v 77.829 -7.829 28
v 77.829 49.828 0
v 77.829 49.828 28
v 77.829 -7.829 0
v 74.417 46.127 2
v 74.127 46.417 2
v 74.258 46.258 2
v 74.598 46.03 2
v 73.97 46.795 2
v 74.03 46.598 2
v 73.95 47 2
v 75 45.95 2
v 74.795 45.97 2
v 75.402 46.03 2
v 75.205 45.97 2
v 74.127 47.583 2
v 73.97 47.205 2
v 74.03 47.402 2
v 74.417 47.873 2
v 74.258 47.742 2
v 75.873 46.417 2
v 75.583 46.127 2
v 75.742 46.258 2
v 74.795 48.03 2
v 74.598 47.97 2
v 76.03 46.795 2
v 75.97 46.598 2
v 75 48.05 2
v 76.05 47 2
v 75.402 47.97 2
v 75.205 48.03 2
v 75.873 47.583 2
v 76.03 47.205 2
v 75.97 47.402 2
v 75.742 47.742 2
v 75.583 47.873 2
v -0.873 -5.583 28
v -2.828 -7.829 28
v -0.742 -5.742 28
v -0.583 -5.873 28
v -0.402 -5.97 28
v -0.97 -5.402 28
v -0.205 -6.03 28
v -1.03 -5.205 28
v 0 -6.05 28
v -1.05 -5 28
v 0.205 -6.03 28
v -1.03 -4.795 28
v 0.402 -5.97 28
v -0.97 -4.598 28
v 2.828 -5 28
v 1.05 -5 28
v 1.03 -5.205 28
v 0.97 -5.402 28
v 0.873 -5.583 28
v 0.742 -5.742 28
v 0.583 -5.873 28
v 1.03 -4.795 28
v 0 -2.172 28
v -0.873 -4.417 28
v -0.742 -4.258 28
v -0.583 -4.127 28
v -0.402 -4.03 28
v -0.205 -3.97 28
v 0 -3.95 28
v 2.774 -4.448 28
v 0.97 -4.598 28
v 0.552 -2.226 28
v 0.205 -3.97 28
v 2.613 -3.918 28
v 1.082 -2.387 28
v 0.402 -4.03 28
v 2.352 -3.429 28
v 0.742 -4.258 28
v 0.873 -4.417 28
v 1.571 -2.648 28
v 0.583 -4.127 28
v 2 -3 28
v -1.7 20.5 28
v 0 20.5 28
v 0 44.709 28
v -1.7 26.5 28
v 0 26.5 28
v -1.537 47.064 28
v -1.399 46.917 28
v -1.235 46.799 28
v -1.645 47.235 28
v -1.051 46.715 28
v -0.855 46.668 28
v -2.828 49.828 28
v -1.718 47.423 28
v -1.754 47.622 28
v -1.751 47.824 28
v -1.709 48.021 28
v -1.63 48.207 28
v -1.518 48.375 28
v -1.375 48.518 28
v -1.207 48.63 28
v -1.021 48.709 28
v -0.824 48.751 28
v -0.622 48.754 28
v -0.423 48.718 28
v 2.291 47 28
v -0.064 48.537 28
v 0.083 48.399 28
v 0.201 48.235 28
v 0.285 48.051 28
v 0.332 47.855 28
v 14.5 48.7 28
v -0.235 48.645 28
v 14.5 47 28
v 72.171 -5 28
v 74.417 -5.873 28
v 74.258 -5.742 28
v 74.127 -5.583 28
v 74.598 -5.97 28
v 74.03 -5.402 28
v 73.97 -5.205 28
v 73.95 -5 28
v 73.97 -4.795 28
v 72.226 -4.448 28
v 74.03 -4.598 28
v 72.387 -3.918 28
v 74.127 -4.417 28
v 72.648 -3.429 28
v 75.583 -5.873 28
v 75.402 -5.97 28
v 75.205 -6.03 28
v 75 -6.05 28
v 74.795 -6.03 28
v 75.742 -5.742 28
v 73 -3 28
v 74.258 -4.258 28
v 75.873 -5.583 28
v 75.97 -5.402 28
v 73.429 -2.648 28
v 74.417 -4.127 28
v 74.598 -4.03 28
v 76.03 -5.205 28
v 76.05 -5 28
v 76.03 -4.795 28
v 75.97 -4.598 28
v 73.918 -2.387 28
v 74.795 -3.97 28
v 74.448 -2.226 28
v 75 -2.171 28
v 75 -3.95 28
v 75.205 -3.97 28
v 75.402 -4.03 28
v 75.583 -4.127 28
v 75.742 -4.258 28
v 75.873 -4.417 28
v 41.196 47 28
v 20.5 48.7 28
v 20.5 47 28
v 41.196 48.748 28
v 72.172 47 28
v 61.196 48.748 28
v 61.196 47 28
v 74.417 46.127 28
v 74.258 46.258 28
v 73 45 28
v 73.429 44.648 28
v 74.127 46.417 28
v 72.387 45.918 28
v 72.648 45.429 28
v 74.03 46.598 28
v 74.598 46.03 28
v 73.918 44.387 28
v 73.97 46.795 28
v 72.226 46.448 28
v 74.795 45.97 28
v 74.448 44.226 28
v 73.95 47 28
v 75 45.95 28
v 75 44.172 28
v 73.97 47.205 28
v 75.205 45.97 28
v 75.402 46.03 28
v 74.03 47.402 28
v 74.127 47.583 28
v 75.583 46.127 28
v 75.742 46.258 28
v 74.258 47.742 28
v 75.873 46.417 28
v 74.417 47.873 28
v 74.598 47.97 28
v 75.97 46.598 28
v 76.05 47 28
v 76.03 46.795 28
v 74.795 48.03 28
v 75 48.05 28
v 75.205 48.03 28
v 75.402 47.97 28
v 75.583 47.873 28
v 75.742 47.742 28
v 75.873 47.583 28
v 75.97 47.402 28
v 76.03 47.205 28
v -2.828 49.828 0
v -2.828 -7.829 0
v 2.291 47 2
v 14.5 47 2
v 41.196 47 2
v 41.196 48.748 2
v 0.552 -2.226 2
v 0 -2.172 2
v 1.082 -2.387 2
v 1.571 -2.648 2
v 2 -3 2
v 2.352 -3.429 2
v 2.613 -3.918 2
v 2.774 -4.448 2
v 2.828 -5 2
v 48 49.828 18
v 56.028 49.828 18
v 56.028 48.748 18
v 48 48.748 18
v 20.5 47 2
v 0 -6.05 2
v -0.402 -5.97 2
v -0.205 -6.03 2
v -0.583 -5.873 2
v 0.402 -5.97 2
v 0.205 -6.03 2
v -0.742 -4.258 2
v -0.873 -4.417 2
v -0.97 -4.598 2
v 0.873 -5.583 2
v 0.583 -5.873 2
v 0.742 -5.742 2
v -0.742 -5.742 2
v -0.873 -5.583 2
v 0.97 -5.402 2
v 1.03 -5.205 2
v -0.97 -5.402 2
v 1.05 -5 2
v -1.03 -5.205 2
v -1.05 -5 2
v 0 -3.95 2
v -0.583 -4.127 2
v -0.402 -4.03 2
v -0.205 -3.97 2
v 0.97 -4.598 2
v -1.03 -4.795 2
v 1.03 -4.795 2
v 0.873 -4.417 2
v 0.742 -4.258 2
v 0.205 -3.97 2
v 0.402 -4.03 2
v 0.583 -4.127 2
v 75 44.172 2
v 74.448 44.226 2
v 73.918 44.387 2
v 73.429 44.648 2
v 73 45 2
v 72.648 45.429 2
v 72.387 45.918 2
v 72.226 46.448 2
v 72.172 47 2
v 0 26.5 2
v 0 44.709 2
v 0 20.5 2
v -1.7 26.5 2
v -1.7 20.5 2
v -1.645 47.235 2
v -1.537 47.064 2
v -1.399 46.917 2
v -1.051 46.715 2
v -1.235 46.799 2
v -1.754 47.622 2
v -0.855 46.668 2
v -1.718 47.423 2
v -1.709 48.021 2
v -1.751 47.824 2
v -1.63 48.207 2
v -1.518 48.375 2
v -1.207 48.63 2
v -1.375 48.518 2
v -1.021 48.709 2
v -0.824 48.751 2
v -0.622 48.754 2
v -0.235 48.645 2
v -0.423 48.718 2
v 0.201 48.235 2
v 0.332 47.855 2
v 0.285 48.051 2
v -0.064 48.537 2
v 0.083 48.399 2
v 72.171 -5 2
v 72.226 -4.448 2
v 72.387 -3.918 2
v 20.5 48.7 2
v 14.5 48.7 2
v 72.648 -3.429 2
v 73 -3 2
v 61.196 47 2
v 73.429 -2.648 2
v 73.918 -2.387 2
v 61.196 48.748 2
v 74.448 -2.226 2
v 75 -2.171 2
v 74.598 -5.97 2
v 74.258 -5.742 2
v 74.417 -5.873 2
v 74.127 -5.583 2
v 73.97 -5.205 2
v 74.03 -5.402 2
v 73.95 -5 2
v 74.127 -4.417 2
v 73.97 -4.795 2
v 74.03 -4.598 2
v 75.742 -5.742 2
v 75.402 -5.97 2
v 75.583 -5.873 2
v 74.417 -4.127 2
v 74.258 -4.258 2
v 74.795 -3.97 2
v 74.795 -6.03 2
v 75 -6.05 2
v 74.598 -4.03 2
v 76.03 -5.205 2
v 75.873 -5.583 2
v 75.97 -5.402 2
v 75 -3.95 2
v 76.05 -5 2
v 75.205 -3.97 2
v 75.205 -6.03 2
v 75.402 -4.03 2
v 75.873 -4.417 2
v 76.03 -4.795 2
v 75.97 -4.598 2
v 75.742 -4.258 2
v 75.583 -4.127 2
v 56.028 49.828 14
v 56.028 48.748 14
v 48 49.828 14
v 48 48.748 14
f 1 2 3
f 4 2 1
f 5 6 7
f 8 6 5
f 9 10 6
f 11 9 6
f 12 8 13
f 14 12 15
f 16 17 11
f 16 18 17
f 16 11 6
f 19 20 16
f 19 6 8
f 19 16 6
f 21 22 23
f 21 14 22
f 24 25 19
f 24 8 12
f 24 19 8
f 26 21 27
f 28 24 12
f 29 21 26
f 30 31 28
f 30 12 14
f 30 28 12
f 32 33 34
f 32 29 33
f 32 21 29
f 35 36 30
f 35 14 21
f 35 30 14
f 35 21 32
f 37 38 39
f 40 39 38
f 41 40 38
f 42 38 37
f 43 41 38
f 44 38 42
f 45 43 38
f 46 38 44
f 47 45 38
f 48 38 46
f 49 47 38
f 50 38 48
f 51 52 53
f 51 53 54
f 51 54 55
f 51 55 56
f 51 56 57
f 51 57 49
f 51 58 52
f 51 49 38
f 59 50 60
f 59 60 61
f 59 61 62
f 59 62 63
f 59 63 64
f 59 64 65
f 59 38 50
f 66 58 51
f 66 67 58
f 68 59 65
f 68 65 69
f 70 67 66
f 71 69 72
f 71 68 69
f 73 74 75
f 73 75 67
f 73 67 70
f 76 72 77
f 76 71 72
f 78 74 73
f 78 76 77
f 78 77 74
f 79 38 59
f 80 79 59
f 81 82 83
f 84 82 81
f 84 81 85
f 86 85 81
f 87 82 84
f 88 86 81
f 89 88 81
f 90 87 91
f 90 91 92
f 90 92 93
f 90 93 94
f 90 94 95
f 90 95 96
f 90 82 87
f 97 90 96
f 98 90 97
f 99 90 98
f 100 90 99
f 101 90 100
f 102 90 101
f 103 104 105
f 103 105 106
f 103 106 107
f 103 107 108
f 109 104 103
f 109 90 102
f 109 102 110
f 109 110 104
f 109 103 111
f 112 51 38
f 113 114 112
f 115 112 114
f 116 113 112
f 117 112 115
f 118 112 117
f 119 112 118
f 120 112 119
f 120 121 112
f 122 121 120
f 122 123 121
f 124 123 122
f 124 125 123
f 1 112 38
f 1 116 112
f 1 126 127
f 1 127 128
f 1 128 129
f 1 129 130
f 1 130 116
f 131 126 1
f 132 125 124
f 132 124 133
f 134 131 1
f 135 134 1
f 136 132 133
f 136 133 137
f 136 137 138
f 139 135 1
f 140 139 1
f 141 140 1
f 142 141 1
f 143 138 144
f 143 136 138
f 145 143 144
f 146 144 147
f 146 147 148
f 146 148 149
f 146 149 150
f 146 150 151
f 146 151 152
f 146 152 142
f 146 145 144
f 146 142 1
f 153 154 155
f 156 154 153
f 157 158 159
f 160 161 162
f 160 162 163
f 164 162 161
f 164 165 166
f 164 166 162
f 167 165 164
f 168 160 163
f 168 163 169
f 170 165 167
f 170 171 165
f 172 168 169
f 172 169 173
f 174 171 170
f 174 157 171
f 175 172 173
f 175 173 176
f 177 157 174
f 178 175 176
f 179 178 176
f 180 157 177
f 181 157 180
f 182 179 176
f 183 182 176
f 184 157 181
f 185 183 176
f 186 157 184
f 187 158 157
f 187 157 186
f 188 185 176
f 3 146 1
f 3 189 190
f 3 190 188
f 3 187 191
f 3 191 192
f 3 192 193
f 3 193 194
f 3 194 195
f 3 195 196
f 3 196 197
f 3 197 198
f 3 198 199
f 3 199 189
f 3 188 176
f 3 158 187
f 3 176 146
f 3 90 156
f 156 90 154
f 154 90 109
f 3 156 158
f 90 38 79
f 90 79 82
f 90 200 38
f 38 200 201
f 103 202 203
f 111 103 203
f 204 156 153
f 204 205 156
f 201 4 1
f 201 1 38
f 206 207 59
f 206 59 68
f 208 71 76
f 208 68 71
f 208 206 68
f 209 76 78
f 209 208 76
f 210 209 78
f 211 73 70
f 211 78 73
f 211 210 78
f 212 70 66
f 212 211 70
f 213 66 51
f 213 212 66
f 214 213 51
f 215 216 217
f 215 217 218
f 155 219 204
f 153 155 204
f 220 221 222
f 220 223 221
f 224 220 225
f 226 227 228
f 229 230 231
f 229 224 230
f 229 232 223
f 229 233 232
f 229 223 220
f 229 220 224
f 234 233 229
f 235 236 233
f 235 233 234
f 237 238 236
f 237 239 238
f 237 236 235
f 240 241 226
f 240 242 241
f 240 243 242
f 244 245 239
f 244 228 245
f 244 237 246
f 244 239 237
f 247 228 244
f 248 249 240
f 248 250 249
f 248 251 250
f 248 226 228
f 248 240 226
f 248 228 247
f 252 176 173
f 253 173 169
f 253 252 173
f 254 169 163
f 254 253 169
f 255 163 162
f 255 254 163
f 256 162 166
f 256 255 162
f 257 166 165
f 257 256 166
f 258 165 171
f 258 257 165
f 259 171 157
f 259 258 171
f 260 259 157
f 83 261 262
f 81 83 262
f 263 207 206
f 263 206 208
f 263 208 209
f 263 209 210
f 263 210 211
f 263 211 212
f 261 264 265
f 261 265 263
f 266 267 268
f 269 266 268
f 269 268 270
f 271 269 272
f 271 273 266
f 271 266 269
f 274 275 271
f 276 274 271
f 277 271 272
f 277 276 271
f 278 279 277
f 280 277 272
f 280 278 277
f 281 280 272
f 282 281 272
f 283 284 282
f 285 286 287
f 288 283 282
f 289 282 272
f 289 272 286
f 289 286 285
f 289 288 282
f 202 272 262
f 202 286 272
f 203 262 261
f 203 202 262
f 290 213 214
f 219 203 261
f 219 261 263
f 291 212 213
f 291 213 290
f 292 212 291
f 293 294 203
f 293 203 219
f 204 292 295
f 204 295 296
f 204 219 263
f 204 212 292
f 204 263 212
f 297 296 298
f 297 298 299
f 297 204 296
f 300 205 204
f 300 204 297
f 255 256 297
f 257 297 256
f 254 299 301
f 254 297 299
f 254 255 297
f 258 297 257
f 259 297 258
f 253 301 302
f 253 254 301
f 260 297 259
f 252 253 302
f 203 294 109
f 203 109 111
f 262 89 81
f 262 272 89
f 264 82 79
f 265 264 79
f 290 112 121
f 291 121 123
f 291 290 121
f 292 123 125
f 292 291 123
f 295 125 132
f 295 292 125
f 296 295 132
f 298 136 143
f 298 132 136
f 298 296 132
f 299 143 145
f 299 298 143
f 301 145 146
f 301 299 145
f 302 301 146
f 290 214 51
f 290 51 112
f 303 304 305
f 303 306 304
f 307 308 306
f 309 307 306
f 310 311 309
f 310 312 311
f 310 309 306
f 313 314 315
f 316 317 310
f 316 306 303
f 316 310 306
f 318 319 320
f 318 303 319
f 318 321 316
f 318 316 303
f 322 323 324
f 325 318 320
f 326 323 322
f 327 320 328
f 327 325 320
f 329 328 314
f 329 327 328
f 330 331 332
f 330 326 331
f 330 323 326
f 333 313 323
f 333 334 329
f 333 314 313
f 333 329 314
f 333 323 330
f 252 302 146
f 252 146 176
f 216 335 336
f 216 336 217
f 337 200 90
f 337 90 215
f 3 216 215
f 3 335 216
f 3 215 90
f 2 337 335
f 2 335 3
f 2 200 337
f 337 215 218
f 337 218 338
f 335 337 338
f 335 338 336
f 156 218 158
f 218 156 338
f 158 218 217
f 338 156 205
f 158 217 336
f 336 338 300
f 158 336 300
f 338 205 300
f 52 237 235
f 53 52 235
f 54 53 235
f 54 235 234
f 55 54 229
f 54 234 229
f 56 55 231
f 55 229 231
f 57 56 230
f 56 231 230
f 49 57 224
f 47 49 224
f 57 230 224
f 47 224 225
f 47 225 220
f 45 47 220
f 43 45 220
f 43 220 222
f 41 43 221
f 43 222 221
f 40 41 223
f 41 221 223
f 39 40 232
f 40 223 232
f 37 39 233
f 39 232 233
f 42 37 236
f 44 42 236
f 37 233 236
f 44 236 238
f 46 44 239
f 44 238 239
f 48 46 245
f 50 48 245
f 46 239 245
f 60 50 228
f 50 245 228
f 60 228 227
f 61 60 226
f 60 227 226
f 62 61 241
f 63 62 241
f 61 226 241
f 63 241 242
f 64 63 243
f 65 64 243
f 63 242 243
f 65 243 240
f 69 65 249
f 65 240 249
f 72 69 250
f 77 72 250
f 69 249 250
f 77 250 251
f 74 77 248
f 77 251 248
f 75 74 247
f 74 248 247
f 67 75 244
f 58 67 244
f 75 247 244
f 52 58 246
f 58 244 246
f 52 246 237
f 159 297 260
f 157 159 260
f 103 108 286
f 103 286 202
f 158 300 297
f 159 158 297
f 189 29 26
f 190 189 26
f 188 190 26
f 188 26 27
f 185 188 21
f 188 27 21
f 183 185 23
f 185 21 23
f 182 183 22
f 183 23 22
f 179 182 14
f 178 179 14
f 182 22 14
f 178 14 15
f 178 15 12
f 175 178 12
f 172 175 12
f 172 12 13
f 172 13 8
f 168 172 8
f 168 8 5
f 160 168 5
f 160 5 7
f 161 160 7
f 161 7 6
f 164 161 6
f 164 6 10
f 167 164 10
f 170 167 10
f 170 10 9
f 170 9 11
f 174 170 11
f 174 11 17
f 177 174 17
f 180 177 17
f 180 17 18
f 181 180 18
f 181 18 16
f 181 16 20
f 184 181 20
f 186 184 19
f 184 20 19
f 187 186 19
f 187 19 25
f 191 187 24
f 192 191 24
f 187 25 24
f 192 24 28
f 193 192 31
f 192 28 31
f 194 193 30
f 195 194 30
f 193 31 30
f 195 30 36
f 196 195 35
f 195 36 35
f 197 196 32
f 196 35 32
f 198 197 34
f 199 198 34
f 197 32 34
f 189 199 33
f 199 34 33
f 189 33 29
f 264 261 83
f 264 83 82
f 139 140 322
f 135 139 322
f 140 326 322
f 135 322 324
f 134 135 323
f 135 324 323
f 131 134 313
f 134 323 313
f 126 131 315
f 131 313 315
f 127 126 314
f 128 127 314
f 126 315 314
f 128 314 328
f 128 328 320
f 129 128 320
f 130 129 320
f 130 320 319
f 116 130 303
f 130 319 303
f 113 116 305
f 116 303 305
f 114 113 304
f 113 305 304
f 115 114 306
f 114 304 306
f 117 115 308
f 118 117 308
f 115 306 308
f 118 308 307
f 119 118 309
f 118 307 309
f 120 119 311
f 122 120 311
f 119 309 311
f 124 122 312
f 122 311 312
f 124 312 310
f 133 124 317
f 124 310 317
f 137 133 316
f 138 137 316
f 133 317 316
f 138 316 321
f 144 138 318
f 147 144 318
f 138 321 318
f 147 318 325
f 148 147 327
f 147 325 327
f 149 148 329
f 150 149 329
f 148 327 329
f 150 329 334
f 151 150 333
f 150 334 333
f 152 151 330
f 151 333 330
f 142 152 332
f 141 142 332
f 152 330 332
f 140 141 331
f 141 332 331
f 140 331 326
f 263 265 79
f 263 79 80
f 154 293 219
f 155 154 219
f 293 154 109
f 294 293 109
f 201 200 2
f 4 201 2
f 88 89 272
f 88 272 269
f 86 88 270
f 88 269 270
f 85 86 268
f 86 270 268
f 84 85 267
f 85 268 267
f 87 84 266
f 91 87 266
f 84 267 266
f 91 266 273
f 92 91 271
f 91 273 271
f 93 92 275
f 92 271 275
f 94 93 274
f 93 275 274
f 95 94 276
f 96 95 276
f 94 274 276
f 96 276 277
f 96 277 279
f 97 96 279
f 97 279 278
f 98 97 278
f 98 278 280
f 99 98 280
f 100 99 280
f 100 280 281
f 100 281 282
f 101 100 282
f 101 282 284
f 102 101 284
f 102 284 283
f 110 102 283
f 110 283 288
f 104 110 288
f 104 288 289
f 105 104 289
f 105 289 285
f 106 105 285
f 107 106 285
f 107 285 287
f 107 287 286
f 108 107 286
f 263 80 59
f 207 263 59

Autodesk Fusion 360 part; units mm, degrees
sketch "Sketch1" plane through (0, 0, 0) normal (0, 0, 1) x (1, 0, 0)
  line L0 (0, 0.9105) -> (0, 44.7087)
  line L1 (2.2913, 47) -> (17.5, 47)
  line L2 (17.5, 47) -> (15.35, 47)
  line L3 (0, 23.5) -> (0, 25.65)
  line L4 (0, 23.5) -> (0, 21.35)
  line L5 (-1.7, 23.5) -> (-1.7, 25.8)
  line L6 (-1.7, 23.5) -> (-1.7, 21.2)
  line L7 (70, 47) -> (74, 47) construction
  line L8 (0, 47) -> (-2.8284, 49.8284)
  line L9 (0, 47) -> (-4, 47) construction
  line L10 (-2.8284, 49.8284) -> (72.8284, 49.8284)
  line L11 (-2.8284, 49.8284) -> (-2.8284, -2.8284)
  line L12 (17.5, 47) -> (69, 47)
  line L13 (41.1957, 48.7475) -> (61.1957, 48.7475)
  line L14 (41.1957, 48.7475) -> (41.1957, 47)
  line L15 (61.1957, 48.7475) -> (61.1957, 47)
  line L16 (17.5, 48.7) -> (14.5, 48.7)
  line L17 (14.5, 48.7) -> (20.5, 48.7)
  line L18 (20.5, 48.7) -> (20.5, 47)
  line L19 (14.5, 48.7) -> (14.5, 47)
  line L20 (-1.7, 23.5) -> (-1.7, 26.5)
  line L21 (-1.7, 26.5) -> (-1.7, 23.5)
  line L22 (-1.7, 23.5) -> (-1.7, 20.5)
  line L23 (-1.7, 20.5) -> (-1.7, 26.5)
  line L24 (0, 26.5) -> (-1.7, 26.5)
  line L25 (-1.7, 20.5) -> (0, 20.5)
  line L26 (0, 47) -> (0, 48)
  line L27 (0, 48) -> (2.2913, 47)
  line L28 (0, 47) -> (-1, 47)
  line L29 (-1, 47) -> (0, 44.7087)
  arc A0 (0, 48) -> (-1, 47) centre (0, 47) ccw
  line L30 (-2.8284, 49.8284) -> (-2.8284, -7.8286)
  line L31 (-2.8284, 49.8284) -> (77.8286, 49.8284)
  line L32 (77.8286, 49.8284) -> (77.8286, -7.8286)
  line L33 (77.8286, -7.8286) -> (-2.8284, -7.8286)
  line L34 (0, -5) -> (75, -5)
  line L35 (75, -5) -> (75, 47)
  line L36 (75, 47) -> (69, 47)
  line L37 (0, 0.9105) -> (0, -5)
  circle A1 centre (75, 47) radius 2.8284
  circle A2 centre (75, 47) radius 1.05
  circle A3 centre (75, -5) radius 2.8286
  circle A4 centre (75, -5) radius 1.05
  circle A5 centre (0, -5) radius 2.8284
  circle A6 centre (0, -5) radius 1.05
  circle A7 centre (-0.7071, 47.7071) radius 1.05
  dimension "d2" = 47
  dimension "d3" = 17.5
  dimension "d5" = 2.15
  dimension "d23" = 2.15
  dimension "d25" = 1.7
  dimension "d26" = 2.3
  dimension "d27" = 2.3
  dimension "d33" = 45
  dimension "d34" = 4
  dimension "d59" = 6
  dimension "d60" = 3
  dimension "d61" = 3
  dimension "d63" = 2
  dimension "d70" = 20
  dimension "d72" = 2.5
  dimension "d73" = 2.5
  dimension "d126" = 57.657
  dimension "d127" = 80.657
  dimension "d128" = 2.1
  dimension "d129" = 2.1
  dimension "d130" = 2.1
  dimension "d131" = 2.1
sketch "Sketch2" plane through (0, 49.8284, 0) normal (0, 1, 0) x (-1, 0, 0)
  line L0 (-72.8284, 0) -> (2.8284, 0)
  line L1 (2.8284, 0) -> (2.8284, 28)
  line L2 (2.8284, 28) -> (-72.8284, 28)
  line L3 (-72.8284, 28) -> (-72.8284, 0)
  line L4 (-72.8284, 0) -> (-42.8284, 0)
  line L5 (-42.8284, 0) -> (-52.0284, 0)
  line L6 (-52.0284, 0) -> (-52.0284, 18)
  line L7 (-52.0284, 18) -> (-56.0284, 18)
  line L8 (-56.0284, 18) -> (-48.0284, 18)
  line L9 (-48.0284, 18) -> (-48.0284, 15)
  line L10 (-56.0284, 15) -> (-56.0284, 18)
  line L11 (-56.0284, 18) -> (-48, 18)
  line L12 (-48, 18) -> (-48, 14)
  line L13 (-48, 14) -> (-56.0284, 14)
  line L14 (-56.0284, 14) -> (-56.0284, 18)
  dimension "d49" = 30
  dimension "d50" = 9.2
  dimension "d51" = 18
  dimension "d52" = 4
  dimension "d53" = 8
  dimension "d54" = 3
extrude "Extrude25" add sketch "Sketch1" along normal blind 28 contours L0 L5 L6 L8 L11 L20 L21 L22 L23 L24 L25 L29 L30 L37 A5 A7 | L34 L37 A5 A6 | L34 L37 A5 A6 | L33 L34 A3 A5 | L30 L33 A5 | L34 L35 A3 A4 | L34 L35 A3 A4 | L32 L35 A1 A3 | L32 L33 A3 | L1 L8 L10 L12 L13 L14 L15 L16 L17 L18 L19 L27 L31 L36 A1 A7 | L35 L36 A1 A2 | L35 L36 A1 A2 | L31 L32 A1
extrude "Extrude26" add sketch "Sketch1" along normal blind 2
extrude "Extrude27" cut sketch "Sketch2" against normal blind 6 contours L6 L7 L8 L10 L11 L13 L14 | L6 L8 L11 L12 L13
equation "d3 = ( 35 / 2 ) * 1 mm"
equation "d50 = ( 18.4 / 2 ) * 1 mm"
